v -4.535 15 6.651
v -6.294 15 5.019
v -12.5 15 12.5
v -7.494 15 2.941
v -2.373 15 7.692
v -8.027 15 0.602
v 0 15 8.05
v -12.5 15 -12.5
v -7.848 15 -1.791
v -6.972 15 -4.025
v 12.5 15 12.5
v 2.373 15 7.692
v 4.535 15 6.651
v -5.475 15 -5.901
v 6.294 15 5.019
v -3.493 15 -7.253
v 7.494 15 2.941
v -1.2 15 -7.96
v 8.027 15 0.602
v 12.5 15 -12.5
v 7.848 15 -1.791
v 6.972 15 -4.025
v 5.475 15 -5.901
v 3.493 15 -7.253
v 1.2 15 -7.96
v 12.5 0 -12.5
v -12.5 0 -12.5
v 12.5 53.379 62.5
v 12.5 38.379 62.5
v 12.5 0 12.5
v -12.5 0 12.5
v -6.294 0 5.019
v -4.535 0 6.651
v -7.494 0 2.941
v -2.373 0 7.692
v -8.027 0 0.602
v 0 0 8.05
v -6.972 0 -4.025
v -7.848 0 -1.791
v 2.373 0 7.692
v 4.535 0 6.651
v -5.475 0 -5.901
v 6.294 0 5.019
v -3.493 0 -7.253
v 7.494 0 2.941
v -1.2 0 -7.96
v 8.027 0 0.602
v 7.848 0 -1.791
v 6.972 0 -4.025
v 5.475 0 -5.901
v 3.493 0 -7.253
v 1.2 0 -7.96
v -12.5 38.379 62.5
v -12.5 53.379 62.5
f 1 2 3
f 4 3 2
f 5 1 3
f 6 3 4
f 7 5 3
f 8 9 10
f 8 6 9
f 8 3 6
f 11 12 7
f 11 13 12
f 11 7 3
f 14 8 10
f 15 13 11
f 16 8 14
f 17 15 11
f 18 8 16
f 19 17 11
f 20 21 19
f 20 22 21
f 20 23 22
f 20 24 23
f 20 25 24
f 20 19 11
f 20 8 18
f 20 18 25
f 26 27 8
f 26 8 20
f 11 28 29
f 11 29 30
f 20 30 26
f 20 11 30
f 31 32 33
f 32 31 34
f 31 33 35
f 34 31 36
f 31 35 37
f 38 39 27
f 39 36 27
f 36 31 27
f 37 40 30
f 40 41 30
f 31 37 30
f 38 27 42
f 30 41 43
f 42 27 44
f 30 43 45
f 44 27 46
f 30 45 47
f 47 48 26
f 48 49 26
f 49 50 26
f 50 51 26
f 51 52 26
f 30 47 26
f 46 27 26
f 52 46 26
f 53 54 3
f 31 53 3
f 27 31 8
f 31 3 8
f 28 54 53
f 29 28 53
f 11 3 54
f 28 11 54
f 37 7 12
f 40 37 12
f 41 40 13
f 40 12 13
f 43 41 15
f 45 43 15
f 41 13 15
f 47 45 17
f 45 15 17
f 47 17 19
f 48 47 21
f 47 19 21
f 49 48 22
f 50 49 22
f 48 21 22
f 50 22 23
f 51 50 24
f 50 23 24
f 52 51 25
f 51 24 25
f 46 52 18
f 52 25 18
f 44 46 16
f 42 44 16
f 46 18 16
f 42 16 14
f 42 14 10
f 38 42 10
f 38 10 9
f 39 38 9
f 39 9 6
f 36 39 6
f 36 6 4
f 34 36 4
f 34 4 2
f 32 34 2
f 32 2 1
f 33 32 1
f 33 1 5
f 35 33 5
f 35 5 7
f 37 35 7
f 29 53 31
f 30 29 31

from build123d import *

# Parameters (mm, degrees)
SKETCH_1_W          = 25
SKETCH_1_H          = 25
EXTRUDE_1_DEPTH     = 15
SKETCH_2_R          = 8.05
CUT_EXTRUDE_1_DEPTH = 24.184046239
EXTRUDE_2_DEPTH     = 25


with BuildPart() as part:
    # 草图1 → 凸台-拉伸1 (new body)
    with BuildSketch(Plane(origin=(0, 0, 0), x_dir=(1, 0, 0), z_dir=(0, 1, 0))):
        Rectangle(SKETCH_1_W, SKETCH_1_H)
    extrude(amount=EXTRUDE_1_DEPTH)

    # 草图2 → 切除-拉伸1 (cut, through all)
    with BuildSketch(Plane(origin=(0, 15, 0), x_dir=(1, 0, 0), z_dir=(0, 1, 0))):
        with Locations(Location((0, 0, 0), (0, 0, 270))):
            Circle(SKETCH_2_R)
    extrude(amount=-CUT_EXTRUDE_1_DEPTH, mode=Mode.SUBTRACT)

    # 草图3 → 凸台-拉伸2 (add)
    with BuildSketch(Plane.ZY.offset(12.5)):
        Polygon((12.5, 15), (62.5, 53.379349155), (62.5, 38.379349155), (12.5, 0), align=None)
    extrude(amount=-EXTRUDE_2_DEPTH)


solid = part.part
